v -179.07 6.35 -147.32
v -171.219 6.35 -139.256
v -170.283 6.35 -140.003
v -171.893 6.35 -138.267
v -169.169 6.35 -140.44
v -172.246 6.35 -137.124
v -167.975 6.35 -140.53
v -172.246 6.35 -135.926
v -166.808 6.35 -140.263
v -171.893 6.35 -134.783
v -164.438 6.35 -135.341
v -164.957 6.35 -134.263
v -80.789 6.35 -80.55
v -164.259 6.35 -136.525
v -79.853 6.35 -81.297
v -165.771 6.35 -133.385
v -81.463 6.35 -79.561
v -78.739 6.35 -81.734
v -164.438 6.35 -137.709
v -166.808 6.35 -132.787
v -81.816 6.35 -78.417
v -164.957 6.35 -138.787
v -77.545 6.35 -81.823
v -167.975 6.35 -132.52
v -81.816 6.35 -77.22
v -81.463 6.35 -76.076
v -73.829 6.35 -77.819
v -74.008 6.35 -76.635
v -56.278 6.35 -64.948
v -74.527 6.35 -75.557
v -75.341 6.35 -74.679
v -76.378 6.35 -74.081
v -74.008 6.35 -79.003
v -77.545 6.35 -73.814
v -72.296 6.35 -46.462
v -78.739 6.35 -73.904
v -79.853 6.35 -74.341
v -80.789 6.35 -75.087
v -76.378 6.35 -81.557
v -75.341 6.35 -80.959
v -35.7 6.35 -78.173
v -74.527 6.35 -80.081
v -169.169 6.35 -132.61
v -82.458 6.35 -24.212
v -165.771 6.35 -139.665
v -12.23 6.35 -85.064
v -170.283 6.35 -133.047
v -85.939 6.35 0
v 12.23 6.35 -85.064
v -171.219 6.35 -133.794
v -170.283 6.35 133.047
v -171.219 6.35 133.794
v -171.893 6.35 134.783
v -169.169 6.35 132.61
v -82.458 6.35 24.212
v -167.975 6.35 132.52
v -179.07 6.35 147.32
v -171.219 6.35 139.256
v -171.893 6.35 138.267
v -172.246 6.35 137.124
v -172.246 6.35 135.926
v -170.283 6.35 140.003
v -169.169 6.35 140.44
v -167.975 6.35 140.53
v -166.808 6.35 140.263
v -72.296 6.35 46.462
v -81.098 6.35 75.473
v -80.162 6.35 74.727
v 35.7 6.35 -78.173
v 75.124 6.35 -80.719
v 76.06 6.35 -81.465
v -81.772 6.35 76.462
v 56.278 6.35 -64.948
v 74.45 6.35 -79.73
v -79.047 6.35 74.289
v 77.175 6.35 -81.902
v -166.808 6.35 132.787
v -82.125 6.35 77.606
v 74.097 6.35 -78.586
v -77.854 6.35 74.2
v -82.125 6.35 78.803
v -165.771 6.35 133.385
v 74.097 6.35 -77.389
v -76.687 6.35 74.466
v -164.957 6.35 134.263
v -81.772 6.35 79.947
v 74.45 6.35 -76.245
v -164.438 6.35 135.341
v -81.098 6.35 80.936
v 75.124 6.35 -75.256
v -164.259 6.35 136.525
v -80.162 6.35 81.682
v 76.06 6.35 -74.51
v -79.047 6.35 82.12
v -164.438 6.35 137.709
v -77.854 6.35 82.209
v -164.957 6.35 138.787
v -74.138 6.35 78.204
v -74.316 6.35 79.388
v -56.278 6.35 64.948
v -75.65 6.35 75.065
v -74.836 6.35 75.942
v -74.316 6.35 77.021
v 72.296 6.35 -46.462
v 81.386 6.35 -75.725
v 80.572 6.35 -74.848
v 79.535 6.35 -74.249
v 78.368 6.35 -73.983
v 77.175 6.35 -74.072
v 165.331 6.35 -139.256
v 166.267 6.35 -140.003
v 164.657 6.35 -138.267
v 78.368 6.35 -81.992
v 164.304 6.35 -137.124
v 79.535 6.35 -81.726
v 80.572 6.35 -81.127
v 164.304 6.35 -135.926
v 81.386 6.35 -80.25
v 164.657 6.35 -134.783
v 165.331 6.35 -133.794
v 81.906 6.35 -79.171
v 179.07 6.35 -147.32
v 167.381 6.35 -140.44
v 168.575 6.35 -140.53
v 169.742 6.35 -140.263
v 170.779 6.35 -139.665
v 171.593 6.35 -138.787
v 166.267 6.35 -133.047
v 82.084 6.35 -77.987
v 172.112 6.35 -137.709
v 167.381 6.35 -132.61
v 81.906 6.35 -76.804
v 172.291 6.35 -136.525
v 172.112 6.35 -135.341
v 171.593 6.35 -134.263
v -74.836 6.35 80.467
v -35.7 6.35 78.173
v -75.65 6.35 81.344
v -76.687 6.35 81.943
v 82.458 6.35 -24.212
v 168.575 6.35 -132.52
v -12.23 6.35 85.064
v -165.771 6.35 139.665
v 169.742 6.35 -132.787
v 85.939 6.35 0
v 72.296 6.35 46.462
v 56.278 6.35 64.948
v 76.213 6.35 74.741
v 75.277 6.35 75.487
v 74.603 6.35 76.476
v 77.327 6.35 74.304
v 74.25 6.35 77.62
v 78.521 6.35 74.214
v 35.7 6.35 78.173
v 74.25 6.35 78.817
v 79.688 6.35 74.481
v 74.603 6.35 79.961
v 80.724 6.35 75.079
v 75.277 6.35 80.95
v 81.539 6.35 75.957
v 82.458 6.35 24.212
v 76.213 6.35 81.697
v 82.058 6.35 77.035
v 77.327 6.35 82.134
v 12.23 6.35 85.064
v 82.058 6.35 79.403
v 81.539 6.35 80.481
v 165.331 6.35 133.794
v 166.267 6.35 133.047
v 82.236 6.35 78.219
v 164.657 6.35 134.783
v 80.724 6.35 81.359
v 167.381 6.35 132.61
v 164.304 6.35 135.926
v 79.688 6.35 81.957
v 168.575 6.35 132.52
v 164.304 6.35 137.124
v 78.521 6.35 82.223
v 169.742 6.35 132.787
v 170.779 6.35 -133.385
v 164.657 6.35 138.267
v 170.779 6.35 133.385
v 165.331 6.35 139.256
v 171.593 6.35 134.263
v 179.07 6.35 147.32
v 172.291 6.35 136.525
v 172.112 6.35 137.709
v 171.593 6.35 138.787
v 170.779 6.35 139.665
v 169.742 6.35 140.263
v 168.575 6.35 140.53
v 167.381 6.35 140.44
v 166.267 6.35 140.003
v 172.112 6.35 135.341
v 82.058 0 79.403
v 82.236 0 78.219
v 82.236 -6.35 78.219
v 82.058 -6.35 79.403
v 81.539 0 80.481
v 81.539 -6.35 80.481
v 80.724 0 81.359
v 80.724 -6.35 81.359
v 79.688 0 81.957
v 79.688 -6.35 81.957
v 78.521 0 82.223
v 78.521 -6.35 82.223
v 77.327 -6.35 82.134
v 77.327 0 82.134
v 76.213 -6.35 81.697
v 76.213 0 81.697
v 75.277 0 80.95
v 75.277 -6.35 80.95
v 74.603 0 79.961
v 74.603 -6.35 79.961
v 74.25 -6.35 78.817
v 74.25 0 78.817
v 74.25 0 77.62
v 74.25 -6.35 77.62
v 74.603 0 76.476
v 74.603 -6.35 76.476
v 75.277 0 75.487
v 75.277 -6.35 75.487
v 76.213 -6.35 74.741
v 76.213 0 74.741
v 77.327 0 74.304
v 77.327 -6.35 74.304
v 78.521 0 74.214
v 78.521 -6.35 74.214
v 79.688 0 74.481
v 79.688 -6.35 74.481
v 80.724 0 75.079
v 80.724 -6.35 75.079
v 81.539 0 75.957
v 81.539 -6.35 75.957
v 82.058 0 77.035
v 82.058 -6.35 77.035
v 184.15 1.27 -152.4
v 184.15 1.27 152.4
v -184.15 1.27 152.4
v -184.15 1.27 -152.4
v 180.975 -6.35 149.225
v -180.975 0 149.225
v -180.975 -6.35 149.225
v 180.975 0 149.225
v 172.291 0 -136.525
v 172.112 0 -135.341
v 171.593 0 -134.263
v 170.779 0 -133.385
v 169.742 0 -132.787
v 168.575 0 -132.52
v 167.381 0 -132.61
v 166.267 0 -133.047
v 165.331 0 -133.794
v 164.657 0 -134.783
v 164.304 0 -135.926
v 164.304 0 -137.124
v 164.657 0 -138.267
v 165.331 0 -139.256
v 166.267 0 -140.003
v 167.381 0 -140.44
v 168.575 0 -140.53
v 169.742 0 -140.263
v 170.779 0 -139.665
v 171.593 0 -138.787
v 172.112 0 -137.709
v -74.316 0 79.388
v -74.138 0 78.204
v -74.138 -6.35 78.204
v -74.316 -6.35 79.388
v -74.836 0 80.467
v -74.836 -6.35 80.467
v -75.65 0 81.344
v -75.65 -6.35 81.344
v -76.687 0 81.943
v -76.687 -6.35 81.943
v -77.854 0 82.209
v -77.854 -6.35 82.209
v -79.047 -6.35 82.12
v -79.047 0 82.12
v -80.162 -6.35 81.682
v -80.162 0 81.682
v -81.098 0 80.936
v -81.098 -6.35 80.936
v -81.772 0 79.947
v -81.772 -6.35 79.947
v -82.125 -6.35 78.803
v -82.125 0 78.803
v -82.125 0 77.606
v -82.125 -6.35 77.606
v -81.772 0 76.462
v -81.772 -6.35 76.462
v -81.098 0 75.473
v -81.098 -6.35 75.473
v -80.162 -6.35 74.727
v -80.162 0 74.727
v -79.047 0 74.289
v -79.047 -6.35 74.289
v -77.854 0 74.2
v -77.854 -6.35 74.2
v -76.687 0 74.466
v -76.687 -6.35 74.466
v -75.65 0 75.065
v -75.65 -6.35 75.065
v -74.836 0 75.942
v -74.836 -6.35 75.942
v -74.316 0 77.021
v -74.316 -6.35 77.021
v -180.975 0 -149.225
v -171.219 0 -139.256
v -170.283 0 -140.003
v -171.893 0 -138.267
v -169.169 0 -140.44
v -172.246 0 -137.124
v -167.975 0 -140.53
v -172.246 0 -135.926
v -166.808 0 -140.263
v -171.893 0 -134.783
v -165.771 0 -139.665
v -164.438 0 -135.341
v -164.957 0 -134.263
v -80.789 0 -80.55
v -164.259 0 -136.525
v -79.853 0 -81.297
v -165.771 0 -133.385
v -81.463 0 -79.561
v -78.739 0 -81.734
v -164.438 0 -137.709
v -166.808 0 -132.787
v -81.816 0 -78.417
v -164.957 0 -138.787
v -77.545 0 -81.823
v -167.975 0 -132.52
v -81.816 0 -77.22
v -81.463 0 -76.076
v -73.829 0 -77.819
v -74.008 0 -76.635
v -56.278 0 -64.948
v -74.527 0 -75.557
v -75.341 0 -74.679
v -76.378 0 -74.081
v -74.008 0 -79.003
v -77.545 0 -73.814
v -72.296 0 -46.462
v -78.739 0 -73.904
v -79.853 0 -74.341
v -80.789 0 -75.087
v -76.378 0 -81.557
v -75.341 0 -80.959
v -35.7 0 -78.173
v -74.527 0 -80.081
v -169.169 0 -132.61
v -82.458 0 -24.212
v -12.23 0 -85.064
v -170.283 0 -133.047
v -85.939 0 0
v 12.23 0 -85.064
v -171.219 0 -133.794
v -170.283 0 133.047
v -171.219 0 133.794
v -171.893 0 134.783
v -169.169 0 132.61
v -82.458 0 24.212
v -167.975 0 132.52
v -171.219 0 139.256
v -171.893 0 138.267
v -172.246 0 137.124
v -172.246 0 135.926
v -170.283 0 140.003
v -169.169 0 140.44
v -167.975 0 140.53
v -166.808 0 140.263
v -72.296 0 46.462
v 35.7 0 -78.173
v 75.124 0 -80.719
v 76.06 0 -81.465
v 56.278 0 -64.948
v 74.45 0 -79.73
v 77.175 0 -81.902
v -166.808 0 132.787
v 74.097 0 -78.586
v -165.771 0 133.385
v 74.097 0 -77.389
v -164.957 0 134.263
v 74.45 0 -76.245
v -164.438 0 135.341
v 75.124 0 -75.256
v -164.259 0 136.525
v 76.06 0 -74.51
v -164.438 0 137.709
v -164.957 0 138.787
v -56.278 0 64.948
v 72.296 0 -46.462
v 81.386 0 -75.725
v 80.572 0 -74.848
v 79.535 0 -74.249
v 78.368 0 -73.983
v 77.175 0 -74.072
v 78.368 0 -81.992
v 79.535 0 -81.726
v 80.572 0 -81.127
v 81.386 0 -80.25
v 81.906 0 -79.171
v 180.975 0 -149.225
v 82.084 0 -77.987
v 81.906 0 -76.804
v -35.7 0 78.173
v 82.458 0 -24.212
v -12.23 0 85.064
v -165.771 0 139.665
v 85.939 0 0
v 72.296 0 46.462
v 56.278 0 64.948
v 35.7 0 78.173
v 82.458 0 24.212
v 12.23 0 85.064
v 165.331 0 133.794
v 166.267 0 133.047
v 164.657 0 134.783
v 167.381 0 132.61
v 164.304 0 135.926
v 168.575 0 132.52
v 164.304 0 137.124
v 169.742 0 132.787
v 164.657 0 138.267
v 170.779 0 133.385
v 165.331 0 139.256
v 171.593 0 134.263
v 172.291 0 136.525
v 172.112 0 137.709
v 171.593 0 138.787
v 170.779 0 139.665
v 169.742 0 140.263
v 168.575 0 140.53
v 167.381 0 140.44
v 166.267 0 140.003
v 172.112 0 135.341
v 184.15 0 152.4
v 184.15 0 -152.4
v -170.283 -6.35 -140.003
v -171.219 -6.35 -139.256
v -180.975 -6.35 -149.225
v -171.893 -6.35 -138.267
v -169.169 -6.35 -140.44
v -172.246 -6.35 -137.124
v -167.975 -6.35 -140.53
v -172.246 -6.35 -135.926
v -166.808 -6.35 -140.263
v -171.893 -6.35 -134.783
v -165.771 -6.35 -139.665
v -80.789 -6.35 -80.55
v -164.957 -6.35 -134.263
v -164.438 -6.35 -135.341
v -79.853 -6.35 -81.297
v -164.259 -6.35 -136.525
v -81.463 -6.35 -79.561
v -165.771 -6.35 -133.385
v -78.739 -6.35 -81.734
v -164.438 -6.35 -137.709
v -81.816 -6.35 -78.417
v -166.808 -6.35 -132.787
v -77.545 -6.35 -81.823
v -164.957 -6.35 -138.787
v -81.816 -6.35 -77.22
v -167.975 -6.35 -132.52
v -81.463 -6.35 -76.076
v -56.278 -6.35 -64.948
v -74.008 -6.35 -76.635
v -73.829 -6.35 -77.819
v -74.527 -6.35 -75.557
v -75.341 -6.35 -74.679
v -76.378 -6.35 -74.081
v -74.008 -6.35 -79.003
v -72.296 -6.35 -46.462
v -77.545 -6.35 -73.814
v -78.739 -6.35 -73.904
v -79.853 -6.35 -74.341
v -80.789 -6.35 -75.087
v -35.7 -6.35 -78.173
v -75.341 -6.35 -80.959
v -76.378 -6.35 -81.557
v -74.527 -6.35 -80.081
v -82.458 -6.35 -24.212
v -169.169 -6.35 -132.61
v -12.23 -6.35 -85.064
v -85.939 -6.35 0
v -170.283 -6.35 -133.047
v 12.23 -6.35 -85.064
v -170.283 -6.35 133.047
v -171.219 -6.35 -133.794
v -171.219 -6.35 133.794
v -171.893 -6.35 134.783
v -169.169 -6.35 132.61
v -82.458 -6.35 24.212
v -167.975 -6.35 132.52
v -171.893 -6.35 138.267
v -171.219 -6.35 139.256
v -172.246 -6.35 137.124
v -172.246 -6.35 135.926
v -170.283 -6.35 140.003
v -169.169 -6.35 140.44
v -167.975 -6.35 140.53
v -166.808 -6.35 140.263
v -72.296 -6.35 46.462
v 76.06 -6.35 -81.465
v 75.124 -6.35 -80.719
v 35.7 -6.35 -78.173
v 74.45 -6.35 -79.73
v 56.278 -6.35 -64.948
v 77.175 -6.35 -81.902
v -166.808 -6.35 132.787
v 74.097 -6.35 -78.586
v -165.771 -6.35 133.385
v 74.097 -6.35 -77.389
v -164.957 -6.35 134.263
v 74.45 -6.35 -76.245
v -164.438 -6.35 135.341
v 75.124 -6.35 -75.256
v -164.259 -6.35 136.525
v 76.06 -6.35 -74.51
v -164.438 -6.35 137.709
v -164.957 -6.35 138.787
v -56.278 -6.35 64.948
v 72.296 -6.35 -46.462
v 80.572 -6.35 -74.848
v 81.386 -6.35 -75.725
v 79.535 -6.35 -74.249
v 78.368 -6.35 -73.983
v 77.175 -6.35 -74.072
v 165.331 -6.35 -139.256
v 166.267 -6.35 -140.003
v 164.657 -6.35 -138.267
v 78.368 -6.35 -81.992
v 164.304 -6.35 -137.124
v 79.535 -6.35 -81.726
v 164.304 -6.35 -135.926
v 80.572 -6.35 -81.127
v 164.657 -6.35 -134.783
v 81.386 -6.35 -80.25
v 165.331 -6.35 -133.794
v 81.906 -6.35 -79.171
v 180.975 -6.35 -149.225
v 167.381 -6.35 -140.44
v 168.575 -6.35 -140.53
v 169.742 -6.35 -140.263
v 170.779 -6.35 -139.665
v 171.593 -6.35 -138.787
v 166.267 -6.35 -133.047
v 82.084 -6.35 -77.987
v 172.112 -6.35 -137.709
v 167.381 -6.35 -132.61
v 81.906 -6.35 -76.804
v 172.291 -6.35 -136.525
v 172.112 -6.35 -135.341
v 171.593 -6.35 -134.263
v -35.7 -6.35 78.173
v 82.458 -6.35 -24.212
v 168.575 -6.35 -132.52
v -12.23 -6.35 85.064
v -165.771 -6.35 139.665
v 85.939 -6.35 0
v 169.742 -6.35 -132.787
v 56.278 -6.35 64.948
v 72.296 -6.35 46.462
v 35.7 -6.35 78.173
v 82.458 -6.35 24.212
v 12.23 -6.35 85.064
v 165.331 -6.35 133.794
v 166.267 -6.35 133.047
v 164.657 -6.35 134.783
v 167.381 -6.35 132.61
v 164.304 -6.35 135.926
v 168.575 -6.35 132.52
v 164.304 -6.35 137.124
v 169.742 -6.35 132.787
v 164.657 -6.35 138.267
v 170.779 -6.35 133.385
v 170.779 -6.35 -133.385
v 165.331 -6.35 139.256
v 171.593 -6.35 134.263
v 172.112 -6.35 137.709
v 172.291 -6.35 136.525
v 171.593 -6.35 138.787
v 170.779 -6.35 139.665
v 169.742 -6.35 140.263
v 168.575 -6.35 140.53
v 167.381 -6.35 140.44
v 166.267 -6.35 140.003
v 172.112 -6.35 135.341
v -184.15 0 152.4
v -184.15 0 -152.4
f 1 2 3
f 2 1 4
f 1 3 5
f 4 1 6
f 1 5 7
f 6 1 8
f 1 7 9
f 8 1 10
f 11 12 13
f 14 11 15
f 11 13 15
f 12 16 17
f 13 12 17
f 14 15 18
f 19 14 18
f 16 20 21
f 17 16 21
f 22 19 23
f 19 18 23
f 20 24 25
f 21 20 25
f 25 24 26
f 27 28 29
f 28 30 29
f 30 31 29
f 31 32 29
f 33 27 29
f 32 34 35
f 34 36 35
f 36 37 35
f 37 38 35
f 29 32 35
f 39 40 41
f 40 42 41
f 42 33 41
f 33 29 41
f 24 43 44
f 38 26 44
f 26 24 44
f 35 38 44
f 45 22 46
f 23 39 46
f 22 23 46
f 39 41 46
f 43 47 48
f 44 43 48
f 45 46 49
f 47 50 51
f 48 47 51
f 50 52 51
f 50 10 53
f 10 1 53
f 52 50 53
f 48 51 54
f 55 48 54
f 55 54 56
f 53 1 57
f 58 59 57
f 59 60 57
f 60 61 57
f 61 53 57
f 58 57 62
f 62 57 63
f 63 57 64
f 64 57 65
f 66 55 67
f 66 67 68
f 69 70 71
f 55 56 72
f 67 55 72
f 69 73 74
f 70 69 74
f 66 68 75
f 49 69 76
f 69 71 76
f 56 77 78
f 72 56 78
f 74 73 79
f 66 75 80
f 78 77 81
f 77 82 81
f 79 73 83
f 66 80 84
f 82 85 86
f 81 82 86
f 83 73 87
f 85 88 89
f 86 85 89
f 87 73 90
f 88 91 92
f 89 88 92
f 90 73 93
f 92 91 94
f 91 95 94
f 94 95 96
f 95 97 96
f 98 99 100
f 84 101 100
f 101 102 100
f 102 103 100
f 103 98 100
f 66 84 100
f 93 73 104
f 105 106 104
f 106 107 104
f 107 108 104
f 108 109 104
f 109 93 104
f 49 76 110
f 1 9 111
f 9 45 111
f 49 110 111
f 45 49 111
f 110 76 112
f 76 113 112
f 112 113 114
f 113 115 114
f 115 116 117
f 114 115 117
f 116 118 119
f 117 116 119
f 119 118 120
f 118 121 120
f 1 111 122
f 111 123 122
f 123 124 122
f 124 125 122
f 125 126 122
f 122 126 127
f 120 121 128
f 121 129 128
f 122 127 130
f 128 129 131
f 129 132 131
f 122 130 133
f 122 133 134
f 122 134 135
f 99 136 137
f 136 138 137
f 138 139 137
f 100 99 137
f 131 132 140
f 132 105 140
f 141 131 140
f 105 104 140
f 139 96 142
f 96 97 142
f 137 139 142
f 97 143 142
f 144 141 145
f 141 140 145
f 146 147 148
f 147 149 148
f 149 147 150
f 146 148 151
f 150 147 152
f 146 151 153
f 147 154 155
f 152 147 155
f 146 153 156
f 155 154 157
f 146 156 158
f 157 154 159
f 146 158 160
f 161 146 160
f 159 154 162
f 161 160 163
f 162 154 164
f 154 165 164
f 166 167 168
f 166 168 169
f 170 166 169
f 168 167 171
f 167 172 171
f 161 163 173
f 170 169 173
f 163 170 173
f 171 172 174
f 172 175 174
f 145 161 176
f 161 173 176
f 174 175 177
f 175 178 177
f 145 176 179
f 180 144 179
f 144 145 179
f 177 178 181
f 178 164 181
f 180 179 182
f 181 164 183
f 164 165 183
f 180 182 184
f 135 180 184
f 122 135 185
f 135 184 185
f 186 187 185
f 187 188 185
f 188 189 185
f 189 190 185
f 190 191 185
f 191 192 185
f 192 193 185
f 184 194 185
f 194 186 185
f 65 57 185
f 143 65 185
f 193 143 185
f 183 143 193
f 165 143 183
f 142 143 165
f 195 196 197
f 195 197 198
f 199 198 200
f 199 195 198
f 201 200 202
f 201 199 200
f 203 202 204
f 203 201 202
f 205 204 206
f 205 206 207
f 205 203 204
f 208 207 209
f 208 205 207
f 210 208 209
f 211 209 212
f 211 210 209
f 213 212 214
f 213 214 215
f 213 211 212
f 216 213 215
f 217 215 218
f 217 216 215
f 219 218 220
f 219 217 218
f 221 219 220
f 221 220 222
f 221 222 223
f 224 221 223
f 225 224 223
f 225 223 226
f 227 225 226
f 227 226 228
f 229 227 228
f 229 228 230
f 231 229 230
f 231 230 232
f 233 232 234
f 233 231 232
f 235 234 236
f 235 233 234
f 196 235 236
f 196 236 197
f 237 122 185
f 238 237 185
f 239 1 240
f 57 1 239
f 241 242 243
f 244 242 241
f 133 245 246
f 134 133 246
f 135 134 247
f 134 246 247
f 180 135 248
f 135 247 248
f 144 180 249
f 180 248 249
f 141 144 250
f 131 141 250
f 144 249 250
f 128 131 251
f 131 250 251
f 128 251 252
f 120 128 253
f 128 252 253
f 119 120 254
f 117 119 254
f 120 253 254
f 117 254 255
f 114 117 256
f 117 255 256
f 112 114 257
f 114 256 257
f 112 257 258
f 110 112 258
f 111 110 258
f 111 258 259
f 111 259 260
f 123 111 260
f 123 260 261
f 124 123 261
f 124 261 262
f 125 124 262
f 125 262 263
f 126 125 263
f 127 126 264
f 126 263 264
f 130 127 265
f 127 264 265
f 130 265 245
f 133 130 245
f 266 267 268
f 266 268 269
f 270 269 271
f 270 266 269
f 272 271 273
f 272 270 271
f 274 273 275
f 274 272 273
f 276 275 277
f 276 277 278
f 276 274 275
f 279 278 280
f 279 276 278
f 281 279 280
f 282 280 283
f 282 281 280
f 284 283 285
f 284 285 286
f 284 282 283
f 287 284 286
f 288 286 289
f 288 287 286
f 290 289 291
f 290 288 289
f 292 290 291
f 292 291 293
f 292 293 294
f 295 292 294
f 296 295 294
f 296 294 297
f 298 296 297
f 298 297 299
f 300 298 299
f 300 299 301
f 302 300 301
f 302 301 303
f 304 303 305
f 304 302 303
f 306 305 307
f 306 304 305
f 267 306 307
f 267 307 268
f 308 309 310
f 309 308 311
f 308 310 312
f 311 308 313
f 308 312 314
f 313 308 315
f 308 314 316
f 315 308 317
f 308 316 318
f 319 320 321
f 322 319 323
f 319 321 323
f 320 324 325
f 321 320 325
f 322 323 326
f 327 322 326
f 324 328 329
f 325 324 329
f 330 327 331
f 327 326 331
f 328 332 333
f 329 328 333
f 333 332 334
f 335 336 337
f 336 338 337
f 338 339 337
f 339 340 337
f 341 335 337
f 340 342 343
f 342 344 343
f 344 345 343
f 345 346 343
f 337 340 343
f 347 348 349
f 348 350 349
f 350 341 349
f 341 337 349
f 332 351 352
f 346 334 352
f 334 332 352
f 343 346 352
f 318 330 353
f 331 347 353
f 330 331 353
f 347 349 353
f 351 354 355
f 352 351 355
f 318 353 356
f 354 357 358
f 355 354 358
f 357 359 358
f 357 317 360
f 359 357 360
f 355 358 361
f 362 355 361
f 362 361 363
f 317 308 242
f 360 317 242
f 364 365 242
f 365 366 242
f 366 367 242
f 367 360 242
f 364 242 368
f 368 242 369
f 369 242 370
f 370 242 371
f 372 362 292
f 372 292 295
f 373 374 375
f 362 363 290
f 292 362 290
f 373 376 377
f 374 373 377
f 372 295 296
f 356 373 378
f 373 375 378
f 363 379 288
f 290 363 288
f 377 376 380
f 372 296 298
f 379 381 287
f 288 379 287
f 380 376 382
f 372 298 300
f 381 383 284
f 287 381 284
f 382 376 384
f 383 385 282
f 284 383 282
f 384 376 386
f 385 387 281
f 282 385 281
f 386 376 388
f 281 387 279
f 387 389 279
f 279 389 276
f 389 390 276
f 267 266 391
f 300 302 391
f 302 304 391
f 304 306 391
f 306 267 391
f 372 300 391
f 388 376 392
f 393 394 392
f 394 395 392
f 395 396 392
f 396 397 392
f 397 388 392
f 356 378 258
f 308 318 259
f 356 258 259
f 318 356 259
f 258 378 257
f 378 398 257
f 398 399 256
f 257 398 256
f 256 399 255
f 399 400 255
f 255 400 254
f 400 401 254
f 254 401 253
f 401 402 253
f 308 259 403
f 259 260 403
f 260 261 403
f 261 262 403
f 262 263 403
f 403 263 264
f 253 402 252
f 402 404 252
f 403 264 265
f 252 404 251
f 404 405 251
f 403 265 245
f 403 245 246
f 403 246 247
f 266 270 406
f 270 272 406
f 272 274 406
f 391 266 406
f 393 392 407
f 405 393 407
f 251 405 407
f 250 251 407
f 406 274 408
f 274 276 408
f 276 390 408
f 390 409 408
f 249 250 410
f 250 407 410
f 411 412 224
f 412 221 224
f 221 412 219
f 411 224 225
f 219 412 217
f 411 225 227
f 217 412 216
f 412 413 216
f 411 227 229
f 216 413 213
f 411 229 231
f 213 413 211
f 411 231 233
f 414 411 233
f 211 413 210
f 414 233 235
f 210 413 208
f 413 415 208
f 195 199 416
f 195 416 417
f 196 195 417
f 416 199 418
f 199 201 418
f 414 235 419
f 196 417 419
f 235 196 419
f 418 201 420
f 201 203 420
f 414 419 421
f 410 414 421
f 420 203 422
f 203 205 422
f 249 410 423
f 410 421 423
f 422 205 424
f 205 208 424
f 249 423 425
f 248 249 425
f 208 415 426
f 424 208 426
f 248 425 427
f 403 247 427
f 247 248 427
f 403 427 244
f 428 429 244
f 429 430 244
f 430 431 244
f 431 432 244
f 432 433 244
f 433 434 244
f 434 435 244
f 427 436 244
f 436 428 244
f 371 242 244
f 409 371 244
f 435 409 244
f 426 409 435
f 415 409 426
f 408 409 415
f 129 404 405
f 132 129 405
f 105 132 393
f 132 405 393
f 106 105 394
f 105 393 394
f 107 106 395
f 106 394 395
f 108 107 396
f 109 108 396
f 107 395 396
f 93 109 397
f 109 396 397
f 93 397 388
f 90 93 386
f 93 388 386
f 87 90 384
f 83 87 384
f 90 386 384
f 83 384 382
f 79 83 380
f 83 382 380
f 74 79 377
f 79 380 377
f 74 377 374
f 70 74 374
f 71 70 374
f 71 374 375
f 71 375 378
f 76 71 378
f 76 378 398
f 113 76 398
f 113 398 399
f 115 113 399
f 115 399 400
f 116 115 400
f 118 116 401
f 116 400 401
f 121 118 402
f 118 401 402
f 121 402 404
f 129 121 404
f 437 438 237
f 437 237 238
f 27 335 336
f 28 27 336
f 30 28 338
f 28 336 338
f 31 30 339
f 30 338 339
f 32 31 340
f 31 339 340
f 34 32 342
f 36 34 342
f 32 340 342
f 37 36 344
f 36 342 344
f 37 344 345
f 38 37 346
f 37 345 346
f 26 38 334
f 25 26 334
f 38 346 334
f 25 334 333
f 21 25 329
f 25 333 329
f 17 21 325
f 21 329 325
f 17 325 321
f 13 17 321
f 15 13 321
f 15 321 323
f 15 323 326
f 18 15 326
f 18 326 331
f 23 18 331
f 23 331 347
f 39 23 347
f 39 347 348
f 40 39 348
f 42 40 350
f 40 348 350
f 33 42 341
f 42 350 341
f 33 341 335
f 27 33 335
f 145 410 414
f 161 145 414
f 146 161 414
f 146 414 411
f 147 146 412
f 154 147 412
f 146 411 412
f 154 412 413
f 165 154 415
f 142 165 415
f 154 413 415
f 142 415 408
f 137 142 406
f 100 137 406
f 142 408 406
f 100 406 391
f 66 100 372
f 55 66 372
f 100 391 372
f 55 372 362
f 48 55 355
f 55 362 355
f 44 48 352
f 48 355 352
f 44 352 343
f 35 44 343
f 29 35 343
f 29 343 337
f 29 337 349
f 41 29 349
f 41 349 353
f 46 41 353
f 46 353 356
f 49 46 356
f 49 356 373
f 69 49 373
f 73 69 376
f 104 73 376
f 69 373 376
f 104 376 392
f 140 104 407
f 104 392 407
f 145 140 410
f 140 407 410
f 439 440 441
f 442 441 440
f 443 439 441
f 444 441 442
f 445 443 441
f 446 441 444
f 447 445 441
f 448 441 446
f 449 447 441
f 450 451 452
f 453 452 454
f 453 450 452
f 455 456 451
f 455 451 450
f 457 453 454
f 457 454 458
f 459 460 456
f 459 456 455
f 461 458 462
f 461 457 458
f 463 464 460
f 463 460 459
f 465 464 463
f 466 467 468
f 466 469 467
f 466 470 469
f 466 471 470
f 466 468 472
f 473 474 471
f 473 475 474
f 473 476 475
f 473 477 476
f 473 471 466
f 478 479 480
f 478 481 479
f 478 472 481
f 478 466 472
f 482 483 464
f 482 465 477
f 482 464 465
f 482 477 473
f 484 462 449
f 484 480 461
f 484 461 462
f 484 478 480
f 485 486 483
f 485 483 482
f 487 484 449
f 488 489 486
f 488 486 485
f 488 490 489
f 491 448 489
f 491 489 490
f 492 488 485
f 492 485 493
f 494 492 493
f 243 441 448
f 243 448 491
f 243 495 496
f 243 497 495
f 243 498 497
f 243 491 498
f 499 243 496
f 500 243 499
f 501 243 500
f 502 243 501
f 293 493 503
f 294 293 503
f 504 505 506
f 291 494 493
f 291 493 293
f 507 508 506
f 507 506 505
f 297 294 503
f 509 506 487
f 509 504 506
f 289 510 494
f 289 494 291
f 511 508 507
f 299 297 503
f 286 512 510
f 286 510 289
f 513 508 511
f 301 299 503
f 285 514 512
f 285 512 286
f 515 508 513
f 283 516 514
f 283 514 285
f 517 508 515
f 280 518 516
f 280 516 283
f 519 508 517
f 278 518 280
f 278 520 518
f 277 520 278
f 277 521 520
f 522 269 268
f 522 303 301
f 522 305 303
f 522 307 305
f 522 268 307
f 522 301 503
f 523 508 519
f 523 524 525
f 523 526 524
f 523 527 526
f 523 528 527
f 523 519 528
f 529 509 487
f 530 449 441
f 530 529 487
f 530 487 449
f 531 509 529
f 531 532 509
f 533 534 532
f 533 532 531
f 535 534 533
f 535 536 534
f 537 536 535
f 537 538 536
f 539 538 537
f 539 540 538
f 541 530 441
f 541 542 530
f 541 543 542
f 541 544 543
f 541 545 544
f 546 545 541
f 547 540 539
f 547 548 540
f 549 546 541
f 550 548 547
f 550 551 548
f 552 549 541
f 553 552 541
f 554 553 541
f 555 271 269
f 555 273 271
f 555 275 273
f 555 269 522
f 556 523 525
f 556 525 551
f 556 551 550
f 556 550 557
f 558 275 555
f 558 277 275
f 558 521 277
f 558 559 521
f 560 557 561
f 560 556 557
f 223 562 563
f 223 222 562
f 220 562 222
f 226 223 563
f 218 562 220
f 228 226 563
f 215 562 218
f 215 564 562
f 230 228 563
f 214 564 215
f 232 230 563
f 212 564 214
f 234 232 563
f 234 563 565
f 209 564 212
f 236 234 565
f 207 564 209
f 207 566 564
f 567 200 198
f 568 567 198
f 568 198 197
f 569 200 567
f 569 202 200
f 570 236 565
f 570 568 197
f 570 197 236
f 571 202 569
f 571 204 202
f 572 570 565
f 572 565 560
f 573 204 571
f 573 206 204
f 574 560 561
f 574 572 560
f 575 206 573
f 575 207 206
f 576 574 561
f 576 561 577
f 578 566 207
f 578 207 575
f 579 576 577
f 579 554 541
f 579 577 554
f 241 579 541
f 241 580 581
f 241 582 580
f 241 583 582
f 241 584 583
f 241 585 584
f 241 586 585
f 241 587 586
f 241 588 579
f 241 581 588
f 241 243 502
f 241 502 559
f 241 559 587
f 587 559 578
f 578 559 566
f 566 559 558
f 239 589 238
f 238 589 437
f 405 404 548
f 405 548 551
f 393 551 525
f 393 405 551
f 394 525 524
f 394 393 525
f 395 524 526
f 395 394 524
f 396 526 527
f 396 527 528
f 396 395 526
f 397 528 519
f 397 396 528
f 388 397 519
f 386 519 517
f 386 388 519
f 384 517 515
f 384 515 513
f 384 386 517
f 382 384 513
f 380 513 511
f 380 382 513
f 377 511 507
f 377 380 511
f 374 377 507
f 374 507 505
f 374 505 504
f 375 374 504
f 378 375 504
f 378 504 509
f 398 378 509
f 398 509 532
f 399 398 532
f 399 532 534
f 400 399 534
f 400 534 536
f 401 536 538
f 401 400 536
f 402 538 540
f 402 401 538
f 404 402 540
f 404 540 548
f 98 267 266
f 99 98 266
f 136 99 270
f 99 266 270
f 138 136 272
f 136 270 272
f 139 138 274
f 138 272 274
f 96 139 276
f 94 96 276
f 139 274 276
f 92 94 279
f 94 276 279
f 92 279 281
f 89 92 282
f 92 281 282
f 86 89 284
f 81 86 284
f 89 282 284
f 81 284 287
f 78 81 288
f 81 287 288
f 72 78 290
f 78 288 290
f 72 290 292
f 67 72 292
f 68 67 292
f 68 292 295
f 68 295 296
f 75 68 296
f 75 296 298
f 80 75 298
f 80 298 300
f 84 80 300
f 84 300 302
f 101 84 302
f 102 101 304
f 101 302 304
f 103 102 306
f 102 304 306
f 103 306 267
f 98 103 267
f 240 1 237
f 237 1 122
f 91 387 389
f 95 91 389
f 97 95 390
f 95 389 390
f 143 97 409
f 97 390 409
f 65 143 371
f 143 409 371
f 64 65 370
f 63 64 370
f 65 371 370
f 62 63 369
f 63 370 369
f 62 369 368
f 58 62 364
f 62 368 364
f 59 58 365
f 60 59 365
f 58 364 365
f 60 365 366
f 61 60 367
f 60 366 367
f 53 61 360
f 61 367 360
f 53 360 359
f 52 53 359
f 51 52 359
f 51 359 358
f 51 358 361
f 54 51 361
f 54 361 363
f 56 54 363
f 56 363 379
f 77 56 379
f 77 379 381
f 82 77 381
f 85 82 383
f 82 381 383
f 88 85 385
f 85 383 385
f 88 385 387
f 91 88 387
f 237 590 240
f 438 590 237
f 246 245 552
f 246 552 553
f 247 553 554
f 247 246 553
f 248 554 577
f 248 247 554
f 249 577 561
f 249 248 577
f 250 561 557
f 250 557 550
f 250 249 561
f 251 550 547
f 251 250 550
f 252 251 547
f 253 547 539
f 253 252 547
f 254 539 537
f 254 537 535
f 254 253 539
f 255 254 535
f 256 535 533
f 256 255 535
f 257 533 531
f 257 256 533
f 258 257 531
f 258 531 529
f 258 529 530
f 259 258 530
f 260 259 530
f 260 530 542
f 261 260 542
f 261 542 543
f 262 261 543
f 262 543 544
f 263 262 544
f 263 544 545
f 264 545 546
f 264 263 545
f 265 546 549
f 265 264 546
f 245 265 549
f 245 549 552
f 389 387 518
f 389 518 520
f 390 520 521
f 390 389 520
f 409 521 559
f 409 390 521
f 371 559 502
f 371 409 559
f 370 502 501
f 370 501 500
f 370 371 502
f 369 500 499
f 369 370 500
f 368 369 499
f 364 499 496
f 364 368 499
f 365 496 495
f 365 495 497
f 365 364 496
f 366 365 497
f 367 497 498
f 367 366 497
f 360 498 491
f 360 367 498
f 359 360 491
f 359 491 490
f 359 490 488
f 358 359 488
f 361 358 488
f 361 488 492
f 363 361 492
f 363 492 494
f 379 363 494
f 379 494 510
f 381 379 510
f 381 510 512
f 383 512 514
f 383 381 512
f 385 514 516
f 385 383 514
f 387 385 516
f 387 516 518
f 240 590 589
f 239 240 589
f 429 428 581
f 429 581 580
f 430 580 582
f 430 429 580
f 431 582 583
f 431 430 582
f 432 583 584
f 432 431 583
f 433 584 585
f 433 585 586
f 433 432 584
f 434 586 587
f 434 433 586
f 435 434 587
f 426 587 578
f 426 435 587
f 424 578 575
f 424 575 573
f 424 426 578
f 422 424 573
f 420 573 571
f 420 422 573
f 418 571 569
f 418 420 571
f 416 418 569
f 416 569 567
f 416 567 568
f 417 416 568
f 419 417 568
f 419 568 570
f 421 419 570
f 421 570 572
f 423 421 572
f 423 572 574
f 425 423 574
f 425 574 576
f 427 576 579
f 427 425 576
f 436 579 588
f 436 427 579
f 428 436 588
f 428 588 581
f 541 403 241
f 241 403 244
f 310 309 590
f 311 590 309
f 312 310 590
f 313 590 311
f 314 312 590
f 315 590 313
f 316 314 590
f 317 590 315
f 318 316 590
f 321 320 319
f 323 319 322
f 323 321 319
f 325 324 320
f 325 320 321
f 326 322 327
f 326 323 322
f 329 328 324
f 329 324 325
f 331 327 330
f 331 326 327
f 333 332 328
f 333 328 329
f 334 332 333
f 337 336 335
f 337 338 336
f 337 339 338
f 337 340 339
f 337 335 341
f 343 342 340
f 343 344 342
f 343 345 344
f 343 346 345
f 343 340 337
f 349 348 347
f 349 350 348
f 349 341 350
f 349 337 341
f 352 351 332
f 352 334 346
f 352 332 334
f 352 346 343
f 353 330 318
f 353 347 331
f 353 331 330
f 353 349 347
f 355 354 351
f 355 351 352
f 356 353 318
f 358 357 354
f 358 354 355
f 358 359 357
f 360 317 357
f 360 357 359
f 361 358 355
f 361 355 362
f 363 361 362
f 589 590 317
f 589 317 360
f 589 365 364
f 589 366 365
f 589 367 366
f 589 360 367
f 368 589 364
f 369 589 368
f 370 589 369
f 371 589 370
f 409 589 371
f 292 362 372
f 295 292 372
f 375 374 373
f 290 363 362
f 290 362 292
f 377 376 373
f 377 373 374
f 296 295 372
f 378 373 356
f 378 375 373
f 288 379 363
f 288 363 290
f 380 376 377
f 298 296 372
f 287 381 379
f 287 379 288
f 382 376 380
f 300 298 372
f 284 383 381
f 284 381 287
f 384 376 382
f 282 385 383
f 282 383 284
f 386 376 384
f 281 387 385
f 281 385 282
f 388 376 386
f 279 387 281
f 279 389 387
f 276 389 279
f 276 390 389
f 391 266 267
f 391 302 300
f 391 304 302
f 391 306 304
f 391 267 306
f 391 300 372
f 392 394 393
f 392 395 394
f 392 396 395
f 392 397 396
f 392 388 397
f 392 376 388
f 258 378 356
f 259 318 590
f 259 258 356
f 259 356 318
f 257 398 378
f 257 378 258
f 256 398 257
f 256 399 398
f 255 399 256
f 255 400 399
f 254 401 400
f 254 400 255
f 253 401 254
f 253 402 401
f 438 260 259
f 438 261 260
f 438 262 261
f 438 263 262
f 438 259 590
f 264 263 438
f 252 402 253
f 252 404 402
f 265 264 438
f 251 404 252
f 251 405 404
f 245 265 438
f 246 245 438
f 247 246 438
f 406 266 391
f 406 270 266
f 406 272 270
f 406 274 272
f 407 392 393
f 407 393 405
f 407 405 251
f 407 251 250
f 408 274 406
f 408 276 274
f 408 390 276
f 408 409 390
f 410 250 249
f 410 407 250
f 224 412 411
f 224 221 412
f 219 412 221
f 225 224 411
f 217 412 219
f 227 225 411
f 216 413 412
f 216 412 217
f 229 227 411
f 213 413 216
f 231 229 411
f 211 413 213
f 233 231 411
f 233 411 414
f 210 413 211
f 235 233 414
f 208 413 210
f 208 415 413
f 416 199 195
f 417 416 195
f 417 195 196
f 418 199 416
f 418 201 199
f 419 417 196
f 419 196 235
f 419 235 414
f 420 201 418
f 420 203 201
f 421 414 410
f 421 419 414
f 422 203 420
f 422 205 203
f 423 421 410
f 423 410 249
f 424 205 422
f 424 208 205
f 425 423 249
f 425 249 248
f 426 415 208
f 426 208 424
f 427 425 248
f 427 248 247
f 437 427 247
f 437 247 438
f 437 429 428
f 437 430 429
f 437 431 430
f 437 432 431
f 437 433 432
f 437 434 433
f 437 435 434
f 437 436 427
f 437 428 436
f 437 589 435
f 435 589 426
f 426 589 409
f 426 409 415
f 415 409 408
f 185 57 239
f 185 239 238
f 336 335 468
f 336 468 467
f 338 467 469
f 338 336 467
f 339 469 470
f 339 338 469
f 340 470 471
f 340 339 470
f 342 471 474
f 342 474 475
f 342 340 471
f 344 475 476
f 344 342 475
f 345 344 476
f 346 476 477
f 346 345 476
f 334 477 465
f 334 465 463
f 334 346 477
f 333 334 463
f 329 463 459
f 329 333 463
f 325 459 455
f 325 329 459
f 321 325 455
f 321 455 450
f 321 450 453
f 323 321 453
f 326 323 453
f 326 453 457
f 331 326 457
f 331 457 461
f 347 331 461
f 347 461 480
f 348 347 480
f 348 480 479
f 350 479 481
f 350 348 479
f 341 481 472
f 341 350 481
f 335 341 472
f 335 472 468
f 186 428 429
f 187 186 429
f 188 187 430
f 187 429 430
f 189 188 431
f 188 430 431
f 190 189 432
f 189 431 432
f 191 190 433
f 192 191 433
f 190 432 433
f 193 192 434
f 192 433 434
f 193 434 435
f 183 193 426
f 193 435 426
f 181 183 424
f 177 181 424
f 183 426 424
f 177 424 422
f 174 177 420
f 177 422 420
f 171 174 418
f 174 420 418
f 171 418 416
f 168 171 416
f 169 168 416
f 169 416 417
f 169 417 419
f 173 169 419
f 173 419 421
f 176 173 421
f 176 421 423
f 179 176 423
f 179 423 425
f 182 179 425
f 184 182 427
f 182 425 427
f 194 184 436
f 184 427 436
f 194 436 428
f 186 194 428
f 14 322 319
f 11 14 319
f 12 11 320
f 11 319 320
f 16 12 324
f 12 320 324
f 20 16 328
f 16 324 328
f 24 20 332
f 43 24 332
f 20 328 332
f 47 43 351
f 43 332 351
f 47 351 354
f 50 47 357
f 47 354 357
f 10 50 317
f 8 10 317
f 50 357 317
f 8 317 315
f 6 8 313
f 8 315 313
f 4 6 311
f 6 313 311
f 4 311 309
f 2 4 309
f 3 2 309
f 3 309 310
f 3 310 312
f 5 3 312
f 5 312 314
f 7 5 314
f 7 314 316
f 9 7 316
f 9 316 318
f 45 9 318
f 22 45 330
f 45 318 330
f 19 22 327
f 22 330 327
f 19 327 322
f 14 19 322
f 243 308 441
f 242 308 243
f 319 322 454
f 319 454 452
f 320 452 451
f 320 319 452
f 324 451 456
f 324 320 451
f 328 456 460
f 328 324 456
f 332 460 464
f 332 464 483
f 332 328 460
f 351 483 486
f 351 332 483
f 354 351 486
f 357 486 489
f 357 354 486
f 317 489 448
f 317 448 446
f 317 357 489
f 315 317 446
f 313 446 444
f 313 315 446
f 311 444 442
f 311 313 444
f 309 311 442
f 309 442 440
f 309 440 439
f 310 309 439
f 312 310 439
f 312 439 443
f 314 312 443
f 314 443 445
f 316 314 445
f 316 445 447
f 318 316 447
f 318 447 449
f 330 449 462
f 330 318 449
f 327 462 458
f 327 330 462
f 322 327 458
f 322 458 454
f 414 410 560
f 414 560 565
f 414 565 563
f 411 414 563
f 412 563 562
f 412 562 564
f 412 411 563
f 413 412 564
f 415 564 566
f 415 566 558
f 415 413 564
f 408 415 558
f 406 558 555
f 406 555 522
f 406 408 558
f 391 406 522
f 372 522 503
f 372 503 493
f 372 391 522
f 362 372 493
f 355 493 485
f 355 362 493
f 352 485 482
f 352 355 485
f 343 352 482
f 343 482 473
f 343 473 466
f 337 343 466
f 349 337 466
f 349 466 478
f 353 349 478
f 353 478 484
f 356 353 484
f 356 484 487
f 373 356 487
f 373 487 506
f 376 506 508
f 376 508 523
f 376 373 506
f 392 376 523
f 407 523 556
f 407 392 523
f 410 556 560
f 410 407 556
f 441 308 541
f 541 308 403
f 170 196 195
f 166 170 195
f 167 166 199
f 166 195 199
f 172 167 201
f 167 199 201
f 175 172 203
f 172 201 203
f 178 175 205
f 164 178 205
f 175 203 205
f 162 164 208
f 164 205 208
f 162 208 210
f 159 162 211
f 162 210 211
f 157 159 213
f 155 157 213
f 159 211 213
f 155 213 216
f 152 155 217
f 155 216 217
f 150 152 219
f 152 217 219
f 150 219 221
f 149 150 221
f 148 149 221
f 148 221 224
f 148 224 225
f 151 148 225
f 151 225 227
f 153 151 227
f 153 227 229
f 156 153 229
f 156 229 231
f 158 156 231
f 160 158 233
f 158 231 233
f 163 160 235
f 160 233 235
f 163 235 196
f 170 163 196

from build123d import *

# Parameters (mm, degrees)
F0_W     = 361.95
F0_H     = 298.45
F0_R     = 4.015807
F0_R_2   = 85.938782
F1_DEPTH = 6.35
F0_W_2   = 368.3
F0_H_2   = 304.8
F2_DEPTH = 6.35
F3_SIZE  = 5.08


with BuildPart() as f1:
    # F0 (on Front) → F1 (new body)
    with BuildSketch(Plane.XZ):
        Rectangle(F0_W, F0_H)
        with Locations((-168.275, -136.525)):
            Circle(F0_R, mode=Mode.SUBTRACT)
        with Locations((-77.845052, -77.818841)):
            Circle(F0_R, mode=Mode.SUBTRACT)
        with Locations((78.0682, -77.987373)):
            Circle(F0_R, mode=Mode.SUBTRACT)
        with Locations((168.275, -136.525)):
            Circle(F0_R, mode=Mode.SUBTRACT)
        with Locations((-168.275, 136.525)):
            Circle(F0_R, mode=Mode.SUBTRACT)
        with Locations((-78.153893, 78.204393)):
            Circle(F0_R, mode=Mode.SUBTRACT)
        Circle(F0_R_2, mode=Mode.SUBTRACT)
        with Locations((78.220673, 78.21884)):
            Circle(F0_R, mode=Mode.SUBTRACT)
        with Locations((168.275, 136.525)):
            Circle(F0_R, mode=Mode.SUBTRACT)
    extrude(amount=F1_DEPTH)


with BuildPart() as f2:
    # F0 (on Front) → F2 (new body)
    with BuildSketch(Plane.XZ):
        Rectangle(F0_W_2, F0_H_2)
        Rectangle(F0_W, F0_H, mode=Mode.SUBTRACT)
        Rectangle(F0_W, F0_H)
        with Locations((-168.275, -136.525)):
            Circle(F0_R, mode=Mode.SUBTRACT)
        with Locations((-77.845052, -77.818841)):
            Circle(F0_R, mode=Mode.SUBTRACT)
        with Locations((78.0682, -77.987373)):
            Circle(F0_R, mode=Mode.SUBTRACT)
        with Locations((168.275, -136.525)):
            Circle(F0_R, mode=Mode.SUBTRACT)
        with Locations((-168.275, 136.525)):
            Circle(F0_R, mode=Mode.SUBTRACT)
        with Locations((-78.153893, 78.204393)):
            Circle(F0_R, mode=Mode.SUBTRACT)
        Circle(F0_R_2, mode=Mode.SUBTRACT)
        with Locations((78.220673, 78.21884)):
            Circle(F0_R, mode=Mode.SUBTRACT)
        with Locations((168.275, 136.525)):
            Circle(F0_R, mode=Mode.SUBTRACT)
    extrude(amount=-F2_DEPTH)

    # F3
    f3_edges = [f2.edges().sort_by_distance(p)[0] for p in [
        (184.15, 6.35, 0),
        (0, 6.35, 152.4),
        (0, 6.35, -152.4),
        (-184.15, 6.35, 0),
    ]]
    chamfer(f3_edges, length=F3_SIZE)


solid = Compound([f1.part, f2.part])
